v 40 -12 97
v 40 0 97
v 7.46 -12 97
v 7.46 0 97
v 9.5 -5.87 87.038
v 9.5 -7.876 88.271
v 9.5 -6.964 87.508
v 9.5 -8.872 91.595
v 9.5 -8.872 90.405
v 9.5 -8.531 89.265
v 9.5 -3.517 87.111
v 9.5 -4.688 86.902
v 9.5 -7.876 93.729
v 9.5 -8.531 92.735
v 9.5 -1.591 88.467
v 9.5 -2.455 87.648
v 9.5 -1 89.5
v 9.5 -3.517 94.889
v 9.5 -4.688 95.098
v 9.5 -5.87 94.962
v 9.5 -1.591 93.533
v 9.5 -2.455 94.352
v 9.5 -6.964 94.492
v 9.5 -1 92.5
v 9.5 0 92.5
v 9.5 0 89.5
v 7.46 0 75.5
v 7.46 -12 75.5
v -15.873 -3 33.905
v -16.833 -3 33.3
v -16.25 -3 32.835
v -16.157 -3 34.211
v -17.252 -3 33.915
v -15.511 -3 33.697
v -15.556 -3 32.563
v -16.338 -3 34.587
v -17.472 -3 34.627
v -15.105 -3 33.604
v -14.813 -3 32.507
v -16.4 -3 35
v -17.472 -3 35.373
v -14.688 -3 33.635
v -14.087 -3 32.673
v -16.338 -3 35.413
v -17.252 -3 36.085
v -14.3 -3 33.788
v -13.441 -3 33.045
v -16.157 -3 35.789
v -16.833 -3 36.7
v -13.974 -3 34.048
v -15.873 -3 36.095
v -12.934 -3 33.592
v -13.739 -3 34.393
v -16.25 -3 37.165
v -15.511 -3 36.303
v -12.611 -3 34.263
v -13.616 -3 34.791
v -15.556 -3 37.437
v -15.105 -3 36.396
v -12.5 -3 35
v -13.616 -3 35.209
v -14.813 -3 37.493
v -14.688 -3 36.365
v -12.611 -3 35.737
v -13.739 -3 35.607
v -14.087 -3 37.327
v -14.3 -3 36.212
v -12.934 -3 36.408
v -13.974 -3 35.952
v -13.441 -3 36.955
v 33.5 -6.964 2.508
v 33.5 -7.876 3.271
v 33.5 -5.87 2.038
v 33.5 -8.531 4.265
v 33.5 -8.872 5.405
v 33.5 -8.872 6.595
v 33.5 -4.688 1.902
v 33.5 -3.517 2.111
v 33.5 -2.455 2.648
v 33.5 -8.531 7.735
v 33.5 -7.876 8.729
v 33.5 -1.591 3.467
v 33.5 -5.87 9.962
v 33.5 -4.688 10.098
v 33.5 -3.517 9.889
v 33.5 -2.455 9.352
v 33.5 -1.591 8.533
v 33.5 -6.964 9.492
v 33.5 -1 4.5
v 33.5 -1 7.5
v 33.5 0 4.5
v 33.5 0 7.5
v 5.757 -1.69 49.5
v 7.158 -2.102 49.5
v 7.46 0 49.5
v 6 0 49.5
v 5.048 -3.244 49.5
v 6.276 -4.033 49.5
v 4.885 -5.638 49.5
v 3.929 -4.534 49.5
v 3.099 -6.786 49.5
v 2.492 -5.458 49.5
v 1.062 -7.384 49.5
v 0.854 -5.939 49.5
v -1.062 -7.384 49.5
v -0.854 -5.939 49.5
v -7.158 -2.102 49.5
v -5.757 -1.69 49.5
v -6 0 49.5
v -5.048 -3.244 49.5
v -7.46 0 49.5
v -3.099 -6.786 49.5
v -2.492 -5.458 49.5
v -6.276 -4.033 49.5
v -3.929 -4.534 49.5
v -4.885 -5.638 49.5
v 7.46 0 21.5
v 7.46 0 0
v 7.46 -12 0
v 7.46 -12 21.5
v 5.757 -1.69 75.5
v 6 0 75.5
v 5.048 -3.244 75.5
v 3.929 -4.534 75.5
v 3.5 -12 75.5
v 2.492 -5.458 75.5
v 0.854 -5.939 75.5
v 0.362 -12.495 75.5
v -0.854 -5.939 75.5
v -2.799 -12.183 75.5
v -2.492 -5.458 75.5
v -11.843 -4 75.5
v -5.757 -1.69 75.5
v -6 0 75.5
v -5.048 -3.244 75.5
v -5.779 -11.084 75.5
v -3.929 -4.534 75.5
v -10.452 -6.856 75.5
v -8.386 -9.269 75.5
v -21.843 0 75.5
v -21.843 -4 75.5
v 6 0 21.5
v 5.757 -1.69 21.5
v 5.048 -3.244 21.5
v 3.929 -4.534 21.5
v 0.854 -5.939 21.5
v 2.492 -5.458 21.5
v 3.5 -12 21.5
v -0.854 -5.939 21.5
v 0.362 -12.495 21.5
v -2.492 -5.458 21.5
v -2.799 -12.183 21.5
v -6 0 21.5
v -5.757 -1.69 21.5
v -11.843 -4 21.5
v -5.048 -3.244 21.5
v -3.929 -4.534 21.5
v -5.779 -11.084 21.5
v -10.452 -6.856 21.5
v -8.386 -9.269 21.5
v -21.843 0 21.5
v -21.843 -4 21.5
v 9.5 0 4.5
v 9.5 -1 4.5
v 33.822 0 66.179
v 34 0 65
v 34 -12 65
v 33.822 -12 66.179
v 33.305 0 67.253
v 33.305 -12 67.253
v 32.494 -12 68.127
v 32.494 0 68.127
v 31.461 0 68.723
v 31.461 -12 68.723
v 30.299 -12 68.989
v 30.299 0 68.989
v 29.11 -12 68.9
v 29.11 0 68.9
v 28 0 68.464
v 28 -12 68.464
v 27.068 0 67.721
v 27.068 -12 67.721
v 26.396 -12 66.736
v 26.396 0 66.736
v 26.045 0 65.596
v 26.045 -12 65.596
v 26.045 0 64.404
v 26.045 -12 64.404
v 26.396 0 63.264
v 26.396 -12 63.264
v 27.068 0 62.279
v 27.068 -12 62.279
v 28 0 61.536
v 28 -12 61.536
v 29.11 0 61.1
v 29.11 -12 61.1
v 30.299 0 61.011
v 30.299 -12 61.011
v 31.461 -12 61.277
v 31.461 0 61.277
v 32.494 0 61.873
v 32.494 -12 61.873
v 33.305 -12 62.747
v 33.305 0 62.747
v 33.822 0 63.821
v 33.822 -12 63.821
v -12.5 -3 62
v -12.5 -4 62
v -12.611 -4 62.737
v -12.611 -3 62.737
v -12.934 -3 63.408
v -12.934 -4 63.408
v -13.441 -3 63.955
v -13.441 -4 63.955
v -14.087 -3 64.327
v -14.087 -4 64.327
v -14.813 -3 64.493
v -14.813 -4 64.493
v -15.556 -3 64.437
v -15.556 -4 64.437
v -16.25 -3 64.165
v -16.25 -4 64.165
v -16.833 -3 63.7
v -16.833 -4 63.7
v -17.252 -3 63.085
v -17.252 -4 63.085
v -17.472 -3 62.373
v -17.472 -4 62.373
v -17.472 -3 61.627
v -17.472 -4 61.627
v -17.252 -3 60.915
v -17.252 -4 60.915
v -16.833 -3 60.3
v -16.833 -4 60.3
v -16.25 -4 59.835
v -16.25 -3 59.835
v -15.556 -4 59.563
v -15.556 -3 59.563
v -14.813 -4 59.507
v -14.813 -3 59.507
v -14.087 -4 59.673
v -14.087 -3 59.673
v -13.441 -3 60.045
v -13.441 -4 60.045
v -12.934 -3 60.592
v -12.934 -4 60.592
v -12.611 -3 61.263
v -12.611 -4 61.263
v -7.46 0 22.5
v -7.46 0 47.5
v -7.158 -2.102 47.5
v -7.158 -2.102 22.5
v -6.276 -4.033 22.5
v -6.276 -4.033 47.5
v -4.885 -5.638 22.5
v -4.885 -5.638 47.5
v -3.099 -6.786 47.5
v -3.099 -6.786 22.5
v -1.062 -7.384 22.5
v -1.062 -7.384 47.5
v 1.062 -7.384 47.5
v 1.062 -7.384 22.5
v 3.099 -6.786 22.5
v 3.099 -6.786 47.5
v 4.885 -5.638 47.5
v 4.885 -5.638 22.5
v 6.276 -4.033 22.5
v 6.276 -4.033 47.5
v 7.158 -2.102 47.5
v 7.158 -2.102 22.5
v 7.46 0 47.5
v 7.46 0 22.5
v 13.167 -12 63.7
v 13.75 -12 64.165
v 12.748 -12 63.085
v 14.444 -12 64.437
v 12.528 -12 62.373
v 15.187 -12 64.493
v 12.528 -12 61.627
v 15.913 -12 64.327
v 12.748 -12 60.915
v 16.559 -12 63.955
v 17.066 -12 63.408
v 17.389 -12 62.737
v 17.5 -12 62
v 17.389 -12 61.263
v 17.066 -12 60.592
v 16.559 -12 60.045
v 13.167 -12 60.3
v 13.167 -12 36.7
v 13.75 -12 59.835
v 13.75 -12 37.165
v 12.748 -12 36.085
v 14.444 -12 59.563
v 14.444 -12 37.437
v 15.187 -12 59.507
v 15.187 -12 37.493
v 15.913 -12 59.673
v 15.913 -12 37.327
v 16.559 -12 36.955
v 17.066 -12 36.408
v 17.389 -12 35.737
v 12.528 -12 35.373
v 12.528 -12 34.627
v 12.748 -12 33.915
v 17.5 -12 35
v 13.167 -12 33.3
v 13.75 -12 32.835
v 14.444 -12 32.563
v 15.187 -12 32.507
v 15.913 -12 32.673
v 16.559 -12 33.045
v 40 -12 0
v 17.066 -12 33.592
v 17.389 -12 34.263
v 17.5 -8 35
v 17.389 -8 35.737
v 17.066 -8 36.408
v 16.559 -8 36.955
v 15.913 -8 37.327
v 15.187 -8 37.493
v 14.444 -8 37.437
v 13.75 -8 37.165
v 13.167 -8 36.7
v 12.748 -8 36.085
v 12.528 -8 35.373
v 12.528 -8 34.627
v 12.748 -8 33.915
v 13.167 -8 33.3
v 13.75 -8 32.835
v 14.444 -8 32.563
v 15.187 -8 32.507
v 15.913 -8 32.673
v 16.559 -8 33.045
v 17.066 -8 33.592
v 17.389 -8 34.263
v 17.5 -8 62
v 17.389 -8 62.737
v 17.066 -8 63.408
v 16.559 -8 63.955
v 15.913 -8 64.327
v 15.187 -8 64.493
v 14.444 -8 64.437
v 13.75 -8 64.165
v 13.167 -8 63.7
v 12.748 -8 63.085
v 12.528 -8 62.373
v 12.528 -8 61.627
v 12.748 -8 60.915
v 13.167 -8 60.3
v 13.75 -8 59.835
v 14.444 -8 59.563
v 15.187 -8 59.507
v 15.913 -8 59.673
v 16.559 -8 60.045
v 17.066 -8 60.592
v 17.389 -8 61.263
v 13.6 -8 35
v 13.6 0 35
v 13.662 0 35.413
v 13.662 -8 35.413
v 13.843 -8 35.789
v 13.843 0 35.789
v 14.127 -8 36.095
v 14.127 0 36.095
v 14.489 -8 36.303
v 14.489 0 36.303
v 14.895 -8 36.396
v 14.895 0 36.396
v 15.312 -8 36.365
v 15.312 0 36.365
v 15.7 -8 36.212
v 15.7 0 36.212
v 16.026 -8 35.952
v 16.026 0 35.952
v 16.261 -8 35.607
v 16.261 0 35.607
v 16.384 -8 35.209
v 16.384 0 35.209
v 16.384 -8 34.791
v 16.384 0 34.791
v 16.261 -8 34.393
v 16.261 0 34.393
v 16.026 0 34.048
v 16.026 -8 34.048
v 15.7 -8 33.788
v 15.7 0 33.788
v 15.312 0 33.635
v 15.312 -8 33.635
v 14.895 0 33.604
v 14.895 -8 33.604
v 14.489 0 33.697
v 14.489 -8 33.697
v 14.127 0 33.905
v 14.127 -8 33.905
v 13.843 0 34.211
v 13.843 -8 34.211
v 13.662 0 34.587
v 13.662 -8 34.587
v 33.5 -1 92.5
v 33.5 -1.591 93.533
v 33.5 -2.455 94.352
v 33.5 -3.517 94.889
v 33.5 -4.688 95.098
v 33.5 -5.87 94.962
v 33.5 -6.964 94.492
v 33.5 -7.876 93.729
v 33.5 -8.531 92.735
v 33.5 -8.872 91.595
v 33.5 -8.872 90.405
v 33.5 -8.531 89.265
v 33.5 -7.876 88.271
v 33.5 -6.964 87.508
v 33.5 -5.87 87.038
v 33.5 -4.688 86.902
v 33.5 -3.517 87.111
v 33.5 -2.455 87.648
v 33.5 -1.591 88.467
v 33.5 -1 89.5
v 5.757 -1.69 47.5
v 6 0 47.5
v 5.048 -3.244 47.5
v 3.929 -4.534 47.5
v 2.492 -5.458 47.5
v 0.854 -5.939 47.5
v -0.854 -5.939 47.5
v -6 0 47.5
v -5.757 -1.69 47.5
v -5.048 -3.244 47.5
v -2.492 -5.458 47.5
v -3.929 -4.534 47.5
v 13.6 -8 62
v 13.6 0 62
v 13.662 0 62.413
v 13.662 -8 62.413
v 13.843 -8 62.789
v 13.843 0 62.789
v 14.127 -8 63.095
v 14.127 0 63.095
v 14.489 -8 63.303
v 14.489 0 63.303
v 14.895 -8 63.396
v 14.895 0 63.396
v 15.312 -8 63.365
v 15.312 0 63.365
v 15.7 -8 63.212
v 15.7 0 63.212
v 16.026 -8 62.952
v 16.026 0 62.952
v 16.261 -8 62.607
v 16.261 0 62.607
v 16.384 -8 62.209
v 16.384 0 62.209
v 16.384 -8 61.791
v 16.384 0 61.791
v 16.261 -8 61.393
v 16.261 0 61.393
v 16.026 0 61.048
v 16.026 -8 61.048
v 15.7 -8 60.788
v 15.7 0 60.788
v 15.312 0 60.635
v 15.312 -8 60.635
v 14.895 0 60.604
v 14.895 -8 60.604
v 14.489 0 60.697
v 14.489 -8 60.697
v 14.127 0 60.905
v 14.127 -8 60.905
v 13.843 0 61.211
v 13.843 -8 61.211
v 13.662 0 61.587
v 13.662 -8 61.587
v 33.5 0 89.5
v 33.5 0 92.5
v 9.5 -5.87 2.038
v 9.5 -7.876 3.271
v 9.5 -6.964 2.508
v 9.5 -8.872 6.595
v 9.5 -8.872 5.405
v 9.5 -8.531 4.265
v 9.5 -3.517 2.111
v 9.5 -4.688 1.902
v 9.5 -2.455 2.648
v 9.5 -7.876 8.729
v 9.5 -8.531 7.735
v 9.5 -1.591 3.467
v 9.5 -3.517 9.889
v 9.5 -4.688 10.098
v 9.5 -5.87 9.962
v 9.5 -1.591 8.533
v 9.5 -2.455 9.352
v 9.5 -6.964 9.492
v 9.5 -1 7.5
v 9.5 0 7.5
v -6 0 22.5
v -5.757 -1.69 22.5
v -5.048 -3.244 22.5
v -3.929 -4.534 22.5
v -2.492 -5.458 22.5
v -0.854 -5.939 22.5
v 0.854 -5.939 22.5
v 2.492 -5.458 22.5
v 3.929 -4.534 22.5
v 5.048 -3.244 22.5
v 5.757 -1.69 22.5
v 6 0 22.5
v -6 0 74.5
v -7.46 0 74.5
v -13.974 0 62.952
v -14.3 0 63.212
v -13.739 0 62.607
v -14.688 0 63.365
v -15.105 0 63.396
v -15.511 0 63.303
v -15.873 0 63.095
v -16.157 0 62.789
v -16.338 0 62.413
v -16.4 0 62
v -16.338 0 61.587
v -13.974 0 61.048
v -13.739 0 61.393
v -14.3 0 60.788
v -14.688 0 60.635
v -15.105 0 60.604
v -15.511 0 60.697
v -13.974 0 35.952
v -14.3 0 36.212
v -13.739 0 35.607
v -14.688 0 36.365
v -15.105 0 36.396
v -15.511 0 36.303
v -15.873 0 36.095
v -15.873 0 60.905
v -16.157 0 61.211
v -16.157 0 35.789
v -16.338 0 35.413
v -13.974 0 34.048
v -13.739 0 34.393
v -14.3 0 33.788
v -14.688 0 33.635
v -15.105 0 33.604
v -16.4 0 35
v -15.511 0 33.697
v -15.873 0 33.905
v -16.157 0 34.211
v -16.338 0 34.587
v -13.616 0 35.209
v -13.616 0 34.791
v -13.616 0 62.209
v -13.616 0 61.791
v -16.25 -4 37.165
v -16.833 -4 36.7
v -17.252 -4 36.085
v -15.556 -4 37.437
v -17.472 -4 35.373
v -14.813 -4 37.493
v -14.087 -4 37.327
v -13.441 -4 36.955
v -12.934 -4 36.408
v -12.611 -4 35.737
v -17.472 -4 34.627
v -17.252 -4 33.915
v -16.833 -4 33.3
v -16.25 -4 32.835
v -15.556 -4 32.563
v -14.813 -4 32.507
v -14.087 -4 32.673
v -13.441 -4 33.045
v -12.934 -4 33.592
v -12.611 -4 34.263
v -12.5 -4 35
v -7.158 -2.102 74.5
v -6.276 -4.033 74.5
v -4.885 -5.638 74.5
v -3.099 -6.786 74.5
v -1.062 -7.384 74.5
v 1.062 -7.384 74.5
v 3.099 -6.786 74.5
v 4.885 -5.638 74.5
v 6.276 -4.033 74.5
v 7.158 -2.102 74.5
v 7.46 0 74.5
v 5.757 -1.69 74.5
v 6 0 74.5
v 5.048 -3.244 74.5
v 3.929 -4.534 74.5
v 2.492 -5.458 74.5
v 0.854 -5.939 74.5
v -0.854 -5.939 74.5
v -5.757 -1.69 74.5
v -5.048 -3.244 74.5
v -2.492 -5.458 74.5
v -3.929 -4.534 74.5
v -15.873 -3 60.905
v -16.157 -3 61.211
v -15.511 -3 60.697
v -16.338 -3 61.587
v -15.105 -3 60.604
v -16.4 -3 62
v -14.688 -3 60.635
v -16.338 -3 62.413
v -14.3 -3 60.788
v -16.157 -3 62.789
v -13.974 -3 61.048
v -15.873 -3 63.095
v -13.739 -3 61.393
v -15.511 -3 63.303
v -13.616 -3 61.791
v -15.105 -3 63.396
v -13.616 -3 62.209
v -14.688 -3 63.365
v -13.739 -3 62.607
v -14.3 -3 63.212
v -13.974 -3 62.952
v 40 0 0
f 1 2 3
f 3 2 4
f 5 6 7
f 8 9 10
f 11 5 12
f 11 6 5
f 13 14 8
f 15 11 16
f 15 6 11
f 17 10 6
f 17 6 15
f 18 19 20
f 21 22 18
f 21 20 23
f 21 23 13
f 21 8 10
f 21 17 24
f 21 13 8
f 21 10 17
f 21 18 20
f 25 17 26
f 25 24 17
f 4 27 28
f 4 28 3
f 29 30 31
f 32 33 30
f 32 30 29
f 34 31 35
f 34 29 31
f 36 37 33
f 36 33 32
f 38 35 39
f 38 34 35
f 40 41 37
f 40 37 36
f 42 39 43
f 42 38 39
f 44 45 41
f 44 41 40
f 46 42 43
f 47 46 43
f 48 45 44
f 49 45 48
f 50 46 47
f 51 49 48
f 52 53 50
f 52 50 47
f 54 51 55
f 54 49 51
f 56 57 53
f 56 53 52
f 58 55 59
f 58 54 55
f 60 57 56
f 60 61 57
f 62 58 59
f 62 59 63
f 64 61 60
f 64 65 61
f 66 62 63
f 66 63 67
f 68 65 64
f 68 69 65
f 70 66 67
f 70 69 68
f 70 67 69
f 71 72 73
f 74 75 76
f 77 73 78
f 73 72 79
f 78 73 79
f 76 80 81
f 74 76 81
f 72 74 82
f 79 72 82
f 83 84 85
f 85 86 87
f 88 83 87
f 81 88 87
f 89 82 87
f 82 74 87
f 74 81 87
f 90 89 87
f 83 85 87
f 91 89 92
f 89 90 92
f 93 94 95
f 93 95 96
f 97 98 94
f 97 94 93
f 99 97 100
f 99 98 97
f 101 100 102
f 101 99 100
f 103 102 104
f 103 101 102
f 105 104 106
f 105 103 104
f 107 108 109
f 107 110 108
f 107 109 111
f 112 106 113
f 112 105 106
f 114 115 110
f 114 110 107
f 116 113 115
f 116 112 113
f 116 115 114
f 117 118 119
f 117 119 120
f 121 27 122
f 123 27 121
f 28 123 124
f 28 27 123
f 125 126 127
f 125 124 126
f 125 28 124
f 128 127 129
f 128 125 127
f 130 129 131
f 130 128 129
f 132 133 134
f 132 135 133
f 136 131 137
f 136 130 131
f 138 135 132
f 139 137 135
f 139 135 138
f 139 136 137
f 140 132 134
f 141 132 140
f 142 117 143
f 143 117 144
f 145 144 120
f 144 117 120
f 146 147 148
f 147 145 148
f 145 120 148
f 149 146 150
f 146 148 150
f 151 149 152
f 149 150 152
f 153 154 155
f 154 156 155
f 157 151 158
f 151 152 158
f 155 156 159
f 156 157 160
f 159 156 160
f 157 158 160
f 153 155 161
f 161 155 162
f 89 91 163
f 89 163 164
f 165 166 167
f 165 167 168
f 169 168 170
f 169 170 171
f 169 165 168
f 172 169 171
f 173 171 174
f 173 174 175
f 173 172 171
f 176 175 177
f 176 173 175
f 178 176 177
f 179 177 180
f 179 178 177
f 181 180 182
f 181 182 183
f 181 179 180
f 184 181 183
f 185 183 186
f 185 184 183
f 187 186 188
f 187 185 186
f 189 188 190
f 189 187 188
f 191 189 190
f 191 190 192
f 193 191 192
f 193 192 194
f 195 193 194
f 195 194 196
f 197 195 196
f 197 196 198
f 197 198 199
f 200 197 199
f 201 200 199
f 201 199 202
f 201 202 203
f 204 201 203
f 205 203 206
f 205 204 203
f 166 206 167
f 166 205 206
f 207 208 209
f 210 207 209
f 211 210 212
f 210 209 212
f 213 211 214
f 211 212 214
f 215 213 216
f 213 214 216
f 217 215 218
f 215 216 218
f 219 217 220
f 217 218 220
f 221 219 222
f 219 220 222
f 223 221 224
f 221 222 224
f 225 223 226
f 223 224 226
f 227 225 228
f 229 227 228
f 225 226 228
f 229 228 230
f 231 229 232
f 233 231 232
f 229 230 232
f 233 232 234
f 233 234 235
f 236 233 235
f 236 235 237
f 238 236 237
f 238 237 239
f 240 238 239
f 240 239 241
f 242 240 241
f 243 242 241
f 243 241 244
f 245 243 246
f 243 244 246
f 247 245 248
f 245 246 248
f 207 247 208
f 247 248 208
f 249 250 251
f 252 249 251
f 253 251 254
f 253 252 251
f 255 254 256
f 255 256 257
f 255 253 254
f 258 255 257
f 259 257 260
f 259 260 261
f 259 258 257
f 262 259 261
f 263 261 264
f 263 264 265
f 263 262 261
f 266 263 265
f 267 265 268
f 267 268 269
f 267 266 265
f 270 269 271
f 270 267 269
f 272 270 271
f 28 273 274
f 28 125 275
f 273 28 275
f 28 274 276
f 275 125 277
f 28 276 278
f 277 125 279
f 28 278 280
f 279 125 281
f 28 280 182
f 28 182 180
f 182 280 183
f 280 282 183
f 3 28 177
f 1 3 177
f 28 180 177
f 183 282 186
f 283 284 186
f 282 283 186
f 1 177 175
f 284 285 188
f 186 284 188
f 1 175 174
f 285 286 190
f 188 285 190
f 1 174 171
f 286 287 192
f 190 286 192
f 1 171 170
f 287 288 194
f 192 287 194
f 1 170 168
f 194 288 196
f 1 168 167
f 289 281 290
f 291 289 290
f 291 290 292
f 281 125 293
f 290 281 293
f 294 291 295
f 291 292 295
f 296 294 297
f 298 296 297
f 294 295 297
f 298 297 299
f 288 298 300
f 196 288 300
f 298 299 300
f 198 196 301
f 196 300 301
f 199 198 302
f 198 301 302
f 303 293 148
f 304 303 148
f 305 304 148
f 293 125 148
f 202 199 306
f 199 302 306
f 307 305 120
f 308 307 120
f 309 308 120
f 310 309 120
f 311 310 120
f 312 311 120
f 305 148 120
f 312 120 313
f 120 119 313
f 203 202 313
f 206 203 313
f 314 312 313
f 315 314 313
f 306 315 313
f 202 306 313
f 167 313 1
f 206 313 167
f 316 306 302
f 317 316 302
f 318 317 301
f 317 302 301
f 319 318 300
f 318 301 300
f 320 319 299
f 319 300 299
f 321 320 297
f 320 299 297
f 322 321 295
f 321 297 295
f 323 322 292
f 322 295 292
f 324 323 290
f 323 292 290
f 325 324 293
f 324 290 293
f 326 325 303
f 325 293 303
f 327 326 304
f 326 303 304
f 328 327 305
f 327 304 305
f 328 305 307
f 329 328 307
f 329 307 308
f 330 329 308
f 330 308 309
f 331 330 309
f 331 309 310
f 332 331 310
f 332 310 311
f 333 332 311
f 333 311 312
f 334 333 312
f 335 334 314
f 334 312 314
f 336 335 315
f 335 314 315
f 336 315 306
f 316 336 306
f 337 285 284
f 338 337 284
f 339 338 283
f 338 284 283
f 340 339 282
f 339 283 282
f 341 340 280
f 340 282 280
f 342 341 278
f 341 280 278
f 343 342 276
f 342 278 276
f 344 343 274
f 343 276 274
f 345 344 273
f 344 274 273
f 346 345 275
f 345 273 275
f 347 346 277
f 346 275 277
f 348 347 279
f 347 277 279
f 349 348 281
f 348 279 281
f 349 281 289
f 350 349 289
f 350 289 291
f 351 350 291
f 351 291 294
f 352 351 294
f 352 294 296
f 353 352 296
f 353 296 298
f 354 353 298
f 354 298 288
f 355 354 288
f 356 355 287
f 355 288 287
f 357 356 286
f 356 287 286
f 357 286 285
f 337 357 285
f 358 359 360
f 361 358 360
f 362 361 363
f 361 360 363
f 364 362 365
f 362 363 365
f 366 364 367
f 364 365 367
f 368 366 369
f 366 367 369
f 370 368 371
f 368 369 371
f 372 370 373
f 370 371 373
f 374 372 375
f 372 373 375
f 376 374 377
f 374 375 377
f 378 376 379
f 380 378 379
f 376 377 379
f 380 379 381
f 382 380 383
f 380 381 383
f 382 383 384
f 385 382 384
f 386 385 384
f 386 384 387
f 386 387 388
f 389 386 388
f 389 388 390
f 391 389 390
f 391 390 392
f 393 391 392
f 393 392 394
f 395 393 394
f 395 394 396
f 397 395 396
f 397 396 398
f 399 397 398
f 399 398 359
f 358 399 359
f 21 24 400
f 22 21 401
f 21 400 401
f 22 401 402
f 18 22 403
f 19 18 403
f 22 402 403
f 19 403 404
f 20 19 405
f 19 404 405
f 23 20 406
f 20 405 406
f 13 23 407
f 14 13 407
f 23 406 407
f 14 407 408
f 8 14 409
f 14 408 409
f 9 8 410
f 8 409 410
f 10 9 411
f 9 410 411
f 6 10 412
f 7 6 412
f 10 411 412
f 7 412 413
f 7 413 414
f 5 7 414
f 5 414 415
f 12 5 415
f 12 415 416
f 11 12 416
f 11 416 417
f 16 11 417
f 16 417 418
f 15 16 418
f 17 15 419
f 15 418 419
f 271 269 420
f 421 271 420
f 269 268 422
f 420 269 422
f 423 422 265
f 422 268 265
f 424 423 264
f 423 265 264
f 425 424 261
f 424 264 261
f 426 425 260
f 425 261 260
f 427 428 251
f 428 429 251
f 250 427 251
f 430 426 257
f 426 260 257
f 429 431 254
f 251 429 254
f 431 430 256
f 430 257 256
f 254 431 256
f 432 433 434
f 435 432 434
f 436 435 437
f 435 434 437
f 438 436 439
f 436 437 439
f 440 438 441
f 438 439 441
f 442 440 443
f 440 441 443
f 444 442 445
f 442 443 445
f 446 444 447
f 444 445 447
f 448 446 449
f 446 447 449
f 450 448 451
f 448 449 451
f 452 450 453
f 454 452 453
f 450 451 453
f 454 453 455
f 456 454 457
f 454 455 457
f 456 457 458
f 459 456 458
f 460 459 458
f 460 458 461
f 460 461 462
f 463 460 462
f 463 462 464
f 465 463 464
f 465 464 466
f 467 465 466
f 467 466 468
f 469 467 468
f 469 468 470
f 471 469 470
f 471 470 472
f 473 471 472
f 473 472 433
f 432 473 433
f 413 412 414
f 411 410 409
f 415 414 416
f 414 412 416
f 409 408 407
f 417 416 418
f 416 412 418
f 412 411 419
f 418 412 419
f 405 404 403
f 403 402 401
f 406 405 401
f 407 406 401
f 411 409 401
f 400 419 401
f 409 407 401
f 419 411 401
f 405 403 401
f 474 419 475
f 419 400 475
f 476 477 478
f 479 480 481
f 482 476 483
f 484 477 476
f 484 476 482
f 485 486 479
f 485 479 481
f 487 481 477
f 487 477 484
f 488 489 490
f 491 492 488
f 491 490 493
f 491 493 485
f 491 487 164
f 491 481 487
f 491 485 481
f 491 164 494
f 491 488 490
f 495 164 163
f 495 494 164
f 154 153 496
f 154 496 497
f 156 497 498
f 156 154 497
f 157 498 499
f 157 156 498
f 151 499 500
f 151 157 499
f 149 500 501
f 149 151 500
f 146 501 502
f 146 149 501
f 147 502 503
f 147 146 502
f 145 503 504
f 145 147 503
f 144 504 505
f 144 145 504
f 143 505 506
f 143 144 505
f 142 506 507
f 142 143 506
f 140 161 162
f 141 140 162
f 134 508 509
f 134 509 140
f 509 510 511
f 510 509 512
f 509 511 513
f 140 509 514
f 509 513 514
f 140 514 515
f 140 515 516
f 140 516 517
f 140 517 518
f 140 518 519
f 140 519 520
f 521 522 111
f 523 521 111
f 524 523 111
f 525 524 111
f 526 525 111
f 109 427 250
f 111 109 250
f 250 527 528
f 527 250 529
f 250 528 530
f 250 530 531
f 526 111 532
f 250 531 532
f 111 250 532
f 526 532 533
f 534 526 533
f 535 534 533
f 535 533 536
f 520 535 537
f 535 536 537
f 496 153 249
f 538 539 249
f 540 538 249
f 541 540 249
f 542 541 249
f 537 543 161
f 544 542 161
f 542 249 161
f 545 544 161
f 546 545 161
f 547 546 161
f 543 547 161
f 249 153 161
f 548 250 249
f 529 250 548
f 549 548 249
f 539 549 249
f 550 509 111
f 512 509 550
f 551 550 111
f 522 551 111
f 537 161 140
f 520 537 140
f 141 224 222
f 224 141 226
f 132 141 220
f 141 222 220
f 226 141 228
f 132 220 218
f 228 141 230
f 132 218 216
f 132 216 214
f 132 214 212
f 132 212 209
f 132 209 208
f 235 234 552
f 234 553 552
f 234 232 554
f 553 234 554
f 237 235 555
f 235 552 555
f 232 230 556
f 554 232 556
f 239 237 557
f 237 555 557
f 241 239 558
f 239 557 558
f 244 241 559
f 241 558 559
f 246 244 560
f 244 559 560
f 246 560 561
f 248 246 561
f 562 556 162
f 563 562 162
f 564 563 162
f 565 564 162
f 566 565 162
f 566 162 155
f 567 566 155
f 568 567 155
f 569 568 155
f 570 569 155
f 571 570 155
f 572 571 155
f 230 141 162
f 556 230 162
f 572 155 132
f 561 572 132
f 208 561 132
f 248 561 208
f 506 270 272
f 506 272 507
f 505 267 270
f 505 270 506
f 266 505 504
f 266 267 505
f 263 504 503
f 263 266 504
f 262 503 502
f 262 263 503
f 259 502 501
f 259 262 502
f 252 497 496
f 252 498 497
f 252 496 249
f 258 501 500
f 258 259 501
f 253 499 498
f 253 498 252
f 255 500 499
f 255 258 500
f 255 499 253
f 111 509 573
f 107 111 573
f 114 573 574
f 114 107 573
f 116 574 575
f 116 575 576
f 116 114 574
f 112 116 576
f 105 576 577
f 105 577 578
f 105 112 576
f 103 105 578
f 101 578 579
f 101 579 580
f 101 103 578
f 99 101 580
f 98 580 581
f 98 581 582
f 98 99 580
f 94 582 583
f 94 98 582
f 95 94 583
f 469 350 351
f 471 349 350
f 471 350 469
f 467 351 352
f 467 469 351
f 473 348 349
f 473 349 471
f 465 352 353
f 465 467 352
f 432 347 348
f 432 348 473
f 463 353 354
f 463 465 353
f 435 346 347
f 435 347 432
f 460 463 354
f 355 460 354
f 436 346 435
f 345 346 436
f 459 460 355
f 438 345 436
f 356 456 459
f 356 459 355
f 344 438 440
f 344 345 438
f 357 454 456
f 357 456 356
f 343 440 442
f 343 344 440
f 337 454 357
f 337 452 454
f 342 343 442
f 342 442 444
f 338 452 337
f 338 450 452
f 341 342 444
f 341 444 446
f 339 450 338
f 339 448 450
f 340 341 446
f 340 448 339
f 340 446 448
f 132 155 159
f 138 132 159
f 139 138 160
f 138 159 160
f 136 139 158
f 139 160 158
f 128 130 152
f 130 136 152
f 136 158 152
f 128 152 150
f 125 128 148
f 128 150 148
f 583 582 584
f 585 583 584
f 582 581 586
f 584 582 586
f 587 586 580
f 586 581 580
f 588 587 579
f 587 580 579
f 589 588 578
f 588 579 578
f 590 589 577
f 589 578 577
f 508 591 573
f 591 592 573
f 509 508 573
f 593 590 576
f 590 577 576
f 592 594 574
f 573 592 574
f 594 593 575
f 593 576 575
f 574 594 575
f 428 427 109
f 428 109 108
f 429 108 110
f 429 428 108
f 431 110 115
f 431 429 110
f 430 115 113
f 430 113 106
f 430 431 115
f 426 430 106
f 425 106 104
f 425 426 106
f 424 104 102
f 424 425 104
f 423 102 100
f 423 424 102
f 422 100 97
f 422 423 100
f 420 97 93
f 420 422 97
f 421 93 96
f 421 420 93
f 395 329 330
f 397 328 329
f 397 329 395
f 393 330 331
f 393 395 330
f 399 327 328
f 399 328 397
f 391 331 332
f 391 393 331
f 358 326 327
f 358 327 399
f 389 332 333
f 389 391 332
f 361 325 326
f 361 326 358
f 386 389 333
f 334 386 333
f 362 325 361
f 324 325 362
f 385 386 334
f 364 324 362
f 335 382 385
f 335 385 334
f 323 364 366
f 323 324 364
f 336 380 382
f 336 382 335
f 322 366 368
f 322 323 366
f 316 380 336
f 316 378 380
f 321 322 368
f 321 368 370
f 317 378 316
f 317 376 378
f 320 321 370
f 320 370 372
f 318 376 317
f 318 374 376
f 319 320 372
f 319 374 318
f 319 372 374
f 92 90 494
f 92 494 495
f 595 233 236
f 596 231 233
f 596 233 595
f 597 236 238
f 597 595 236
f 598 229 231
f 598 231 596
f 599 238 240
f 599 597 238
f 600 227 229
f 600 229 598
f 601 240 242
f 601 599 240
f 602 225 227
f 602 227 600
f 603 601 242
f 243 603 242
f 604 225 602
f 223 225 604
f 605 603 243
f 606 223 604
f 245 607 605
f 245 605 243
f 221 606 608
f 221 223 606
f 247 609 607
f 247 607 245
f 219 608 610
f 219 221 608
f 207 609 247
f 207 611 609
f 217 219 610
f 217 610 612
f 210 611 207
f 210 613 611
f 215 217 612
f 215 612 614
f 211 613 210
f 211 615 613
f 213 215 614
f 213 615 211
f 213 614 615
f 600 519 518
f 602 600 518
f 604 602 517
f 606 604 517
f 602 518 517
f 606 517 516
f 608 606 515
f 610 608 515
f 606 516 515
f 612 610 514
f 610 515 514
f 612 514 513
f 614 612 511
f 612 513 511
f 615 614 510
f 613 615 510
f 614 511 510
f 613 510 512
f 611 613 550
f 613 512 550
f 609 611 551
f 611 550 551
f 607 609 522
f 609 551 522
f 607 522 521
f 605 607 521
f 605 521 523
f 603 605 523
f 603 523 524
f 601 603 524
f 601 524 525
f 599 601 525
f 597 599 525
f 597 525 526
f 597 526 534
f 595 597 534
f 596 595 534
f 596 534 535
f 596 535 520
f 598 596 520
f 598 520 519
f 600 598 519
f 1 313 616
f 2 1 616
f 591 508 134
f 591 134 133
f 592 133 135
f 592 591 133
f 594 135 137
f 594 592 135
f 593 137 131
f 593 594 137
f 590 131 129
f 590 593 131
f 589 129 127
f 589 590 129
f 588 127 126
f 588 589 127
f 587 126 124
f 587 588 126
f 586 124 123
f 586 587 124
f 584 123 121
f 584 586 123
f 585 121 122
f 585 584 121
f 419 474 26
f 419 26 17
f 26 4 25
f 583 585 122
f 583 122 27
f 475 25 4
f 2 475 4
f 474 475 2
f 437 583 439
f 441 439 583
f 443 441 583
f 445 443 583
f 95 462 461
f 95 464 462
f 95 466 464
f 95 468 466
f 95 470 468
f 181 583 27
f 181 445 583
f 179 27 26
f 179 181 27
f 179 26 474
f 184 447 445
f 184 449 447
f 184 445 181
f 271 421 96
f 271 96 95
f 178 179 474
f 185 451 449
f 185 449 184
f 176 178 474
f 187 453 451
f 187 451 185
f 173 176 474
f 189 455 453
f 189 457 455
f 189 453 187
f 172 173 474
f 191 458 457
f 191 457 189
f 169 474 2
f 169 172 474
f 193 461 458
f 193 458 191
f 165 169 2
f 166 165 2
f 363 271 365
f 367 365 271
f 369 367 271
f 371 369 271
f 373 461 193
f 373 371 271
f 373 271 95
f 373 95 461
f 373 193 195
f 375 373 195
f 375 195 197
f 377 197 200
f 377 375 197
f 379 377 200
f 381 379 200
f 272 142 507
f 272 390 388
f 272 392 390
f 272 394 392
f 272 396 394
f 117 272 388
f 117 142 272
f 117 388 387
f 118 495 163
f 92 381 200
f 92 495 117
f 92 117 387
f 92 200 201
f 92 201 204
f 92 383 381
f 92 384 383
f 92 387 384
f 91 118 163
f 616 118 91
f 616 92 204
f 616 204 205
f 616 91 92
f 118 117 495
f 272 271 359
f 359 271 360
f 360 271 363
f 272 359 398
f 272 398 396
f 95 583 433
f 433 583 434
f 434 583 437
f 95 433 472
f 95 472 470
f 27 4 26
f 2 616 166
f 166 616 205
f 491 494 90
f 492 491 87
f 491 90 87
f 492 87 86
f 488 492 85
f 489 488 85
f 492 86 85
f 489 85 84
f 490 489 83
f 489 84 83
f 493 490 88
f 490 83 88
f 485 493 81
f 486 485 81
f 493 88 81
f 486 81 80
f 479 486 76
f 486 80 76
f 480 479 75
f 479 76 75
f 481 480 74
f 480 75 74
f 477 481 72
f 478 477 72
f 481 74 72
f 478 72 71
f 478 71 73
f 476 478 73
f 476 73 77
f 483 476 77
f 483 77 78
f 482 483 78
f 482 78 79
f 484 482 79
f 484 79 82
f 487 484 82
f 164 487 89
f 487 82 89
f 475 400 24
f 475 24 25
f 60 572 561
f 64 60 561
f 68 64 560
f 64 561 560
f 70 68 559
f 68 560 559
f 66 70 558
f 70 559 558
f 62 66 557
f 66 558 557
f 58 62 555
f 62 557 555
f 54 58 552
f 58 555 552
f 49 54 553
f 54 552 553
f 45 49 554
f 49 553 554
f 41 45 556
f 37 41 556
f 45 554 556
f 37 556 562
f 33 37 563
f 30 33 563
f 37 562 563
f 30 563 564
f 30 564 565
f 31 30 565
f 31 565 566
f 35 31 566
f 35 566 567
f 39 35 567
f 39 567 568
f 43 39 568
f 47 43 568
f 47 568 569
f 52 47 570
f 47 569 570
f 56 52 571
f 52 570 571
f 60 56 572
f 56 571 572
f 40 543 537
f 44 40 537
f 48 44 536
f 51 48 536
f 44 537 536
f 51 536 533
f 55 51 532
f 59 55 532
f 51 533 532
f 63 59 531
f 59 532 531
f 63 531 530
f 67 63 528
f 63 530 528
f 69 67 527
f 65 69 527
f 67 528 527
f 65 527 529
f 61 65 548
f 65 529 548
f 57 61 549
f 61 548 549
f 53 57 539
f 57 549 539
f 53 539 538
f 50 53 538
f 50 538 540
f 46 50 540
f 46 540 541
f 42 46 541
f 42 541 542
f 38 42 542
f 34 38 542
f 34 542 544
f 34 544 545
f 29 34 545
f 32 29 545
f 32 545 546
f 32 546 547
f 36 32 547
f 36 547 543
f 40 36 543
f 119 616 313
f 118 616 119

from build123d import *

# Parameters (mm, degrees)
SKETCH012_R  = 4
PAD008_DEPTH = 12
SKETCH001_R  = 1.4
SKETCH001_W  = 29.46
SKETCH001_H  = 21.5
PAD005_DEPTH = 13
PAD006_DEPTH = 24
SKETCH010_R  = 2.5
PAD007_DEPTH = 4
SKETCH011_R  = 2.5
PAD004_DEPTH = 1
PAD001_DEPTH = 1
PAD002_DEPTH = 2
PAD003_DEPTH = 1
PAD_DEPTH    = 97


with BuildPart() as pad008:
    # Sketch012 → Pad008 (new body)
    with BuildSketch(Plane.XZ):
        with Locations((30, 65)):
            Circle(SKETCH012_R)
    extrude(amount=PAD008_DEPTH)


with BuildPart() as pad005:
    # Sketch001 → Pad005 (new body)
    with BuildSketch(Plane(origin=(0, 0, 0), x_dir=(-1, 0, 0), z_dir=(0, 1, 0))):
        with Locations((15, 62)):
            Circle(SKETCH001_R)
        with Locations((15, 35)):
            Circle(SKETCH001_R)
        with Locations((-15, 62)):
            Circle(SKETCH001_R)
        with Locations((-15, 35)):
            Circle(SKETCH001_R)
        with Locations((7.27, 10.75)):
            Rectangle(SKETCH001_W, SKETCH001_H)
        with Locations((7.27, 86.25)):
            Rectangle(SKETCH001_W, SKETCH001_H)
    extrude(amount=-PAD005_DEPTH)


with BuildPart() as pad006:
    # Sketch008 → Pad006 (new body)
    with BuildSketch(Plane.YZ.offset(33.5)):
        with BuildLine():
            ThreePointArc((-1, 7.5), (-8.915757, 6), (-1, 4.5))
            Line((0, 4.5), (-1, 4.5))
            Line((0, 7.5), (0, 4.5))
            Line((-1, 7.5), (0, 7.5))
        make_face()
        with BuildLine():
            ThreePointArc((-1, 92.5), (-8.915757, 91), (-1, 89.5))
            Line((0, 89.5), (-1, 89.5))
            Line((0, 92.5), (0, 89.5))
            Line((-1, 92.5), (0, 92.5))
        make_face()
    extrude(amount=-PAD006_DEPTH)


with BuildPart() as pad007:
    # Sketch010 → Pad007 (new body)
    with BuildSketch(Plane.XZ.offset(12)):
        with Locations((15, 62)):
            Circle(SKETCH010_R)
        with Locations((15, 35)):
            Circle(SKETCH010_R)
    extrude(amount=-PAD007_DEPTH)


with BuildPart() as cutblock:
    # Sketch011 → Pad004 (new body)
    with BuildSketch(Plane.XZ.offset(4)):
        with Locations((-15, 62)):
            Circle(SKETCH011_R)
        with Locations((-15, 35)):
            Circle(SKETCH011_R)
    extrude(amount=-PAD004_DEPTH)

    # Fusion001: union Pad005, Pad006, Pad007
    add(pad005.part)
    add(pad006.part)
    add(pad007.part)


with BuildPart() as pad001:
    # Sketch005 → Pad001 (new body)
    with BuildSketch(Plane(origin=(0, 0, 21.5), x_dir=(-1, 0, 0), z_dir=(0, 0, 1))):
        with BuildLine():
            ThreePointArc((7.46, 0), (0, 7.46), (-7.46, 0))
            Line((-7.46, 0), (-6, 0))
            ThreePointArc((6, 0), (0, 6), (-6, 0))
            Line((7.46, 0), (6, 0))
        make_face()
    extrude(amount=PAD001_DEPTH)


with BuildPart() as pad002:
    # Sketch006 → Pad002 (new body)
    with BuildSketch(Plane(origin=(0, 0, 47.5), x_dir=(-1, 0, 0), z_dir=(0, 0, 1))):
        with BuildLine():
            ThreePointArc((7.46, 0), (0, 7.46), (-7.46, 0))
            Line((-7.46, 0), (-6, 0))
            ThreePointArc((6, 0), (0, 6), (-6, 0))
            Line((7.46, 0), (6, 0))
        make_face()
    extrude(amount=PAD002_DEPTH)


with BuildPart() as pad003:
    # Sketch007 → Pad003 (new body)
    with BuildSketch(Plane(origin=(0, 0, 74.5), x_dir=(-1, 0, 0), z_dir=(0, 0, 1))):
        with BuildLine():
            ThreePointArc((7.46, 0), (0, 7.46), (-7.46, 0))
            Line((-7.46, 0), (-6, 0))
            ThreePointArc((6, 0), (0, 6), (-6, 0))
            Line((7.46, 0), (6, 0))
        make_face()
    extrude(amount=PAD003_DEPTH)


with BuildPart() as cut001:
    # Sketch → Pad (new body)
    with BuildSketch(Plane.XY):
        with BuildLine():
            ThreePointArc((-7.46, 0), (0, -7.46), (7.46, 0))
            Line((7.46, 0), (40, 0))
            Line((40, -12), (40, 0))
            Line((3.5, -12), (40, -12))
            ThreePointArc((-11.842719, -4), (-5.779294, -11.083761), (3.5, -12))
            Line((-21.842719, -4), (-11.842719, -4))
            Line((-21.842719, 0), (-21.842719, -4))
            Line((-7.46, 0), (-21.842719, 0))
        make_face()
    extrude(amount=PAD_DEPTH)

    # Fusion: union Pad001, Pad002, Pad003
    add(pad001.part)
    add(pad002.part)
    add(pad003.part)

    # Cut: cut CutBlock
    add(cutblock.part, mode=Mode.SUBTRACT)

    # Cut001: cut Pad008
    add(pad008.part, mode=Mode.SUBTRACT)


solid = cut001.part
